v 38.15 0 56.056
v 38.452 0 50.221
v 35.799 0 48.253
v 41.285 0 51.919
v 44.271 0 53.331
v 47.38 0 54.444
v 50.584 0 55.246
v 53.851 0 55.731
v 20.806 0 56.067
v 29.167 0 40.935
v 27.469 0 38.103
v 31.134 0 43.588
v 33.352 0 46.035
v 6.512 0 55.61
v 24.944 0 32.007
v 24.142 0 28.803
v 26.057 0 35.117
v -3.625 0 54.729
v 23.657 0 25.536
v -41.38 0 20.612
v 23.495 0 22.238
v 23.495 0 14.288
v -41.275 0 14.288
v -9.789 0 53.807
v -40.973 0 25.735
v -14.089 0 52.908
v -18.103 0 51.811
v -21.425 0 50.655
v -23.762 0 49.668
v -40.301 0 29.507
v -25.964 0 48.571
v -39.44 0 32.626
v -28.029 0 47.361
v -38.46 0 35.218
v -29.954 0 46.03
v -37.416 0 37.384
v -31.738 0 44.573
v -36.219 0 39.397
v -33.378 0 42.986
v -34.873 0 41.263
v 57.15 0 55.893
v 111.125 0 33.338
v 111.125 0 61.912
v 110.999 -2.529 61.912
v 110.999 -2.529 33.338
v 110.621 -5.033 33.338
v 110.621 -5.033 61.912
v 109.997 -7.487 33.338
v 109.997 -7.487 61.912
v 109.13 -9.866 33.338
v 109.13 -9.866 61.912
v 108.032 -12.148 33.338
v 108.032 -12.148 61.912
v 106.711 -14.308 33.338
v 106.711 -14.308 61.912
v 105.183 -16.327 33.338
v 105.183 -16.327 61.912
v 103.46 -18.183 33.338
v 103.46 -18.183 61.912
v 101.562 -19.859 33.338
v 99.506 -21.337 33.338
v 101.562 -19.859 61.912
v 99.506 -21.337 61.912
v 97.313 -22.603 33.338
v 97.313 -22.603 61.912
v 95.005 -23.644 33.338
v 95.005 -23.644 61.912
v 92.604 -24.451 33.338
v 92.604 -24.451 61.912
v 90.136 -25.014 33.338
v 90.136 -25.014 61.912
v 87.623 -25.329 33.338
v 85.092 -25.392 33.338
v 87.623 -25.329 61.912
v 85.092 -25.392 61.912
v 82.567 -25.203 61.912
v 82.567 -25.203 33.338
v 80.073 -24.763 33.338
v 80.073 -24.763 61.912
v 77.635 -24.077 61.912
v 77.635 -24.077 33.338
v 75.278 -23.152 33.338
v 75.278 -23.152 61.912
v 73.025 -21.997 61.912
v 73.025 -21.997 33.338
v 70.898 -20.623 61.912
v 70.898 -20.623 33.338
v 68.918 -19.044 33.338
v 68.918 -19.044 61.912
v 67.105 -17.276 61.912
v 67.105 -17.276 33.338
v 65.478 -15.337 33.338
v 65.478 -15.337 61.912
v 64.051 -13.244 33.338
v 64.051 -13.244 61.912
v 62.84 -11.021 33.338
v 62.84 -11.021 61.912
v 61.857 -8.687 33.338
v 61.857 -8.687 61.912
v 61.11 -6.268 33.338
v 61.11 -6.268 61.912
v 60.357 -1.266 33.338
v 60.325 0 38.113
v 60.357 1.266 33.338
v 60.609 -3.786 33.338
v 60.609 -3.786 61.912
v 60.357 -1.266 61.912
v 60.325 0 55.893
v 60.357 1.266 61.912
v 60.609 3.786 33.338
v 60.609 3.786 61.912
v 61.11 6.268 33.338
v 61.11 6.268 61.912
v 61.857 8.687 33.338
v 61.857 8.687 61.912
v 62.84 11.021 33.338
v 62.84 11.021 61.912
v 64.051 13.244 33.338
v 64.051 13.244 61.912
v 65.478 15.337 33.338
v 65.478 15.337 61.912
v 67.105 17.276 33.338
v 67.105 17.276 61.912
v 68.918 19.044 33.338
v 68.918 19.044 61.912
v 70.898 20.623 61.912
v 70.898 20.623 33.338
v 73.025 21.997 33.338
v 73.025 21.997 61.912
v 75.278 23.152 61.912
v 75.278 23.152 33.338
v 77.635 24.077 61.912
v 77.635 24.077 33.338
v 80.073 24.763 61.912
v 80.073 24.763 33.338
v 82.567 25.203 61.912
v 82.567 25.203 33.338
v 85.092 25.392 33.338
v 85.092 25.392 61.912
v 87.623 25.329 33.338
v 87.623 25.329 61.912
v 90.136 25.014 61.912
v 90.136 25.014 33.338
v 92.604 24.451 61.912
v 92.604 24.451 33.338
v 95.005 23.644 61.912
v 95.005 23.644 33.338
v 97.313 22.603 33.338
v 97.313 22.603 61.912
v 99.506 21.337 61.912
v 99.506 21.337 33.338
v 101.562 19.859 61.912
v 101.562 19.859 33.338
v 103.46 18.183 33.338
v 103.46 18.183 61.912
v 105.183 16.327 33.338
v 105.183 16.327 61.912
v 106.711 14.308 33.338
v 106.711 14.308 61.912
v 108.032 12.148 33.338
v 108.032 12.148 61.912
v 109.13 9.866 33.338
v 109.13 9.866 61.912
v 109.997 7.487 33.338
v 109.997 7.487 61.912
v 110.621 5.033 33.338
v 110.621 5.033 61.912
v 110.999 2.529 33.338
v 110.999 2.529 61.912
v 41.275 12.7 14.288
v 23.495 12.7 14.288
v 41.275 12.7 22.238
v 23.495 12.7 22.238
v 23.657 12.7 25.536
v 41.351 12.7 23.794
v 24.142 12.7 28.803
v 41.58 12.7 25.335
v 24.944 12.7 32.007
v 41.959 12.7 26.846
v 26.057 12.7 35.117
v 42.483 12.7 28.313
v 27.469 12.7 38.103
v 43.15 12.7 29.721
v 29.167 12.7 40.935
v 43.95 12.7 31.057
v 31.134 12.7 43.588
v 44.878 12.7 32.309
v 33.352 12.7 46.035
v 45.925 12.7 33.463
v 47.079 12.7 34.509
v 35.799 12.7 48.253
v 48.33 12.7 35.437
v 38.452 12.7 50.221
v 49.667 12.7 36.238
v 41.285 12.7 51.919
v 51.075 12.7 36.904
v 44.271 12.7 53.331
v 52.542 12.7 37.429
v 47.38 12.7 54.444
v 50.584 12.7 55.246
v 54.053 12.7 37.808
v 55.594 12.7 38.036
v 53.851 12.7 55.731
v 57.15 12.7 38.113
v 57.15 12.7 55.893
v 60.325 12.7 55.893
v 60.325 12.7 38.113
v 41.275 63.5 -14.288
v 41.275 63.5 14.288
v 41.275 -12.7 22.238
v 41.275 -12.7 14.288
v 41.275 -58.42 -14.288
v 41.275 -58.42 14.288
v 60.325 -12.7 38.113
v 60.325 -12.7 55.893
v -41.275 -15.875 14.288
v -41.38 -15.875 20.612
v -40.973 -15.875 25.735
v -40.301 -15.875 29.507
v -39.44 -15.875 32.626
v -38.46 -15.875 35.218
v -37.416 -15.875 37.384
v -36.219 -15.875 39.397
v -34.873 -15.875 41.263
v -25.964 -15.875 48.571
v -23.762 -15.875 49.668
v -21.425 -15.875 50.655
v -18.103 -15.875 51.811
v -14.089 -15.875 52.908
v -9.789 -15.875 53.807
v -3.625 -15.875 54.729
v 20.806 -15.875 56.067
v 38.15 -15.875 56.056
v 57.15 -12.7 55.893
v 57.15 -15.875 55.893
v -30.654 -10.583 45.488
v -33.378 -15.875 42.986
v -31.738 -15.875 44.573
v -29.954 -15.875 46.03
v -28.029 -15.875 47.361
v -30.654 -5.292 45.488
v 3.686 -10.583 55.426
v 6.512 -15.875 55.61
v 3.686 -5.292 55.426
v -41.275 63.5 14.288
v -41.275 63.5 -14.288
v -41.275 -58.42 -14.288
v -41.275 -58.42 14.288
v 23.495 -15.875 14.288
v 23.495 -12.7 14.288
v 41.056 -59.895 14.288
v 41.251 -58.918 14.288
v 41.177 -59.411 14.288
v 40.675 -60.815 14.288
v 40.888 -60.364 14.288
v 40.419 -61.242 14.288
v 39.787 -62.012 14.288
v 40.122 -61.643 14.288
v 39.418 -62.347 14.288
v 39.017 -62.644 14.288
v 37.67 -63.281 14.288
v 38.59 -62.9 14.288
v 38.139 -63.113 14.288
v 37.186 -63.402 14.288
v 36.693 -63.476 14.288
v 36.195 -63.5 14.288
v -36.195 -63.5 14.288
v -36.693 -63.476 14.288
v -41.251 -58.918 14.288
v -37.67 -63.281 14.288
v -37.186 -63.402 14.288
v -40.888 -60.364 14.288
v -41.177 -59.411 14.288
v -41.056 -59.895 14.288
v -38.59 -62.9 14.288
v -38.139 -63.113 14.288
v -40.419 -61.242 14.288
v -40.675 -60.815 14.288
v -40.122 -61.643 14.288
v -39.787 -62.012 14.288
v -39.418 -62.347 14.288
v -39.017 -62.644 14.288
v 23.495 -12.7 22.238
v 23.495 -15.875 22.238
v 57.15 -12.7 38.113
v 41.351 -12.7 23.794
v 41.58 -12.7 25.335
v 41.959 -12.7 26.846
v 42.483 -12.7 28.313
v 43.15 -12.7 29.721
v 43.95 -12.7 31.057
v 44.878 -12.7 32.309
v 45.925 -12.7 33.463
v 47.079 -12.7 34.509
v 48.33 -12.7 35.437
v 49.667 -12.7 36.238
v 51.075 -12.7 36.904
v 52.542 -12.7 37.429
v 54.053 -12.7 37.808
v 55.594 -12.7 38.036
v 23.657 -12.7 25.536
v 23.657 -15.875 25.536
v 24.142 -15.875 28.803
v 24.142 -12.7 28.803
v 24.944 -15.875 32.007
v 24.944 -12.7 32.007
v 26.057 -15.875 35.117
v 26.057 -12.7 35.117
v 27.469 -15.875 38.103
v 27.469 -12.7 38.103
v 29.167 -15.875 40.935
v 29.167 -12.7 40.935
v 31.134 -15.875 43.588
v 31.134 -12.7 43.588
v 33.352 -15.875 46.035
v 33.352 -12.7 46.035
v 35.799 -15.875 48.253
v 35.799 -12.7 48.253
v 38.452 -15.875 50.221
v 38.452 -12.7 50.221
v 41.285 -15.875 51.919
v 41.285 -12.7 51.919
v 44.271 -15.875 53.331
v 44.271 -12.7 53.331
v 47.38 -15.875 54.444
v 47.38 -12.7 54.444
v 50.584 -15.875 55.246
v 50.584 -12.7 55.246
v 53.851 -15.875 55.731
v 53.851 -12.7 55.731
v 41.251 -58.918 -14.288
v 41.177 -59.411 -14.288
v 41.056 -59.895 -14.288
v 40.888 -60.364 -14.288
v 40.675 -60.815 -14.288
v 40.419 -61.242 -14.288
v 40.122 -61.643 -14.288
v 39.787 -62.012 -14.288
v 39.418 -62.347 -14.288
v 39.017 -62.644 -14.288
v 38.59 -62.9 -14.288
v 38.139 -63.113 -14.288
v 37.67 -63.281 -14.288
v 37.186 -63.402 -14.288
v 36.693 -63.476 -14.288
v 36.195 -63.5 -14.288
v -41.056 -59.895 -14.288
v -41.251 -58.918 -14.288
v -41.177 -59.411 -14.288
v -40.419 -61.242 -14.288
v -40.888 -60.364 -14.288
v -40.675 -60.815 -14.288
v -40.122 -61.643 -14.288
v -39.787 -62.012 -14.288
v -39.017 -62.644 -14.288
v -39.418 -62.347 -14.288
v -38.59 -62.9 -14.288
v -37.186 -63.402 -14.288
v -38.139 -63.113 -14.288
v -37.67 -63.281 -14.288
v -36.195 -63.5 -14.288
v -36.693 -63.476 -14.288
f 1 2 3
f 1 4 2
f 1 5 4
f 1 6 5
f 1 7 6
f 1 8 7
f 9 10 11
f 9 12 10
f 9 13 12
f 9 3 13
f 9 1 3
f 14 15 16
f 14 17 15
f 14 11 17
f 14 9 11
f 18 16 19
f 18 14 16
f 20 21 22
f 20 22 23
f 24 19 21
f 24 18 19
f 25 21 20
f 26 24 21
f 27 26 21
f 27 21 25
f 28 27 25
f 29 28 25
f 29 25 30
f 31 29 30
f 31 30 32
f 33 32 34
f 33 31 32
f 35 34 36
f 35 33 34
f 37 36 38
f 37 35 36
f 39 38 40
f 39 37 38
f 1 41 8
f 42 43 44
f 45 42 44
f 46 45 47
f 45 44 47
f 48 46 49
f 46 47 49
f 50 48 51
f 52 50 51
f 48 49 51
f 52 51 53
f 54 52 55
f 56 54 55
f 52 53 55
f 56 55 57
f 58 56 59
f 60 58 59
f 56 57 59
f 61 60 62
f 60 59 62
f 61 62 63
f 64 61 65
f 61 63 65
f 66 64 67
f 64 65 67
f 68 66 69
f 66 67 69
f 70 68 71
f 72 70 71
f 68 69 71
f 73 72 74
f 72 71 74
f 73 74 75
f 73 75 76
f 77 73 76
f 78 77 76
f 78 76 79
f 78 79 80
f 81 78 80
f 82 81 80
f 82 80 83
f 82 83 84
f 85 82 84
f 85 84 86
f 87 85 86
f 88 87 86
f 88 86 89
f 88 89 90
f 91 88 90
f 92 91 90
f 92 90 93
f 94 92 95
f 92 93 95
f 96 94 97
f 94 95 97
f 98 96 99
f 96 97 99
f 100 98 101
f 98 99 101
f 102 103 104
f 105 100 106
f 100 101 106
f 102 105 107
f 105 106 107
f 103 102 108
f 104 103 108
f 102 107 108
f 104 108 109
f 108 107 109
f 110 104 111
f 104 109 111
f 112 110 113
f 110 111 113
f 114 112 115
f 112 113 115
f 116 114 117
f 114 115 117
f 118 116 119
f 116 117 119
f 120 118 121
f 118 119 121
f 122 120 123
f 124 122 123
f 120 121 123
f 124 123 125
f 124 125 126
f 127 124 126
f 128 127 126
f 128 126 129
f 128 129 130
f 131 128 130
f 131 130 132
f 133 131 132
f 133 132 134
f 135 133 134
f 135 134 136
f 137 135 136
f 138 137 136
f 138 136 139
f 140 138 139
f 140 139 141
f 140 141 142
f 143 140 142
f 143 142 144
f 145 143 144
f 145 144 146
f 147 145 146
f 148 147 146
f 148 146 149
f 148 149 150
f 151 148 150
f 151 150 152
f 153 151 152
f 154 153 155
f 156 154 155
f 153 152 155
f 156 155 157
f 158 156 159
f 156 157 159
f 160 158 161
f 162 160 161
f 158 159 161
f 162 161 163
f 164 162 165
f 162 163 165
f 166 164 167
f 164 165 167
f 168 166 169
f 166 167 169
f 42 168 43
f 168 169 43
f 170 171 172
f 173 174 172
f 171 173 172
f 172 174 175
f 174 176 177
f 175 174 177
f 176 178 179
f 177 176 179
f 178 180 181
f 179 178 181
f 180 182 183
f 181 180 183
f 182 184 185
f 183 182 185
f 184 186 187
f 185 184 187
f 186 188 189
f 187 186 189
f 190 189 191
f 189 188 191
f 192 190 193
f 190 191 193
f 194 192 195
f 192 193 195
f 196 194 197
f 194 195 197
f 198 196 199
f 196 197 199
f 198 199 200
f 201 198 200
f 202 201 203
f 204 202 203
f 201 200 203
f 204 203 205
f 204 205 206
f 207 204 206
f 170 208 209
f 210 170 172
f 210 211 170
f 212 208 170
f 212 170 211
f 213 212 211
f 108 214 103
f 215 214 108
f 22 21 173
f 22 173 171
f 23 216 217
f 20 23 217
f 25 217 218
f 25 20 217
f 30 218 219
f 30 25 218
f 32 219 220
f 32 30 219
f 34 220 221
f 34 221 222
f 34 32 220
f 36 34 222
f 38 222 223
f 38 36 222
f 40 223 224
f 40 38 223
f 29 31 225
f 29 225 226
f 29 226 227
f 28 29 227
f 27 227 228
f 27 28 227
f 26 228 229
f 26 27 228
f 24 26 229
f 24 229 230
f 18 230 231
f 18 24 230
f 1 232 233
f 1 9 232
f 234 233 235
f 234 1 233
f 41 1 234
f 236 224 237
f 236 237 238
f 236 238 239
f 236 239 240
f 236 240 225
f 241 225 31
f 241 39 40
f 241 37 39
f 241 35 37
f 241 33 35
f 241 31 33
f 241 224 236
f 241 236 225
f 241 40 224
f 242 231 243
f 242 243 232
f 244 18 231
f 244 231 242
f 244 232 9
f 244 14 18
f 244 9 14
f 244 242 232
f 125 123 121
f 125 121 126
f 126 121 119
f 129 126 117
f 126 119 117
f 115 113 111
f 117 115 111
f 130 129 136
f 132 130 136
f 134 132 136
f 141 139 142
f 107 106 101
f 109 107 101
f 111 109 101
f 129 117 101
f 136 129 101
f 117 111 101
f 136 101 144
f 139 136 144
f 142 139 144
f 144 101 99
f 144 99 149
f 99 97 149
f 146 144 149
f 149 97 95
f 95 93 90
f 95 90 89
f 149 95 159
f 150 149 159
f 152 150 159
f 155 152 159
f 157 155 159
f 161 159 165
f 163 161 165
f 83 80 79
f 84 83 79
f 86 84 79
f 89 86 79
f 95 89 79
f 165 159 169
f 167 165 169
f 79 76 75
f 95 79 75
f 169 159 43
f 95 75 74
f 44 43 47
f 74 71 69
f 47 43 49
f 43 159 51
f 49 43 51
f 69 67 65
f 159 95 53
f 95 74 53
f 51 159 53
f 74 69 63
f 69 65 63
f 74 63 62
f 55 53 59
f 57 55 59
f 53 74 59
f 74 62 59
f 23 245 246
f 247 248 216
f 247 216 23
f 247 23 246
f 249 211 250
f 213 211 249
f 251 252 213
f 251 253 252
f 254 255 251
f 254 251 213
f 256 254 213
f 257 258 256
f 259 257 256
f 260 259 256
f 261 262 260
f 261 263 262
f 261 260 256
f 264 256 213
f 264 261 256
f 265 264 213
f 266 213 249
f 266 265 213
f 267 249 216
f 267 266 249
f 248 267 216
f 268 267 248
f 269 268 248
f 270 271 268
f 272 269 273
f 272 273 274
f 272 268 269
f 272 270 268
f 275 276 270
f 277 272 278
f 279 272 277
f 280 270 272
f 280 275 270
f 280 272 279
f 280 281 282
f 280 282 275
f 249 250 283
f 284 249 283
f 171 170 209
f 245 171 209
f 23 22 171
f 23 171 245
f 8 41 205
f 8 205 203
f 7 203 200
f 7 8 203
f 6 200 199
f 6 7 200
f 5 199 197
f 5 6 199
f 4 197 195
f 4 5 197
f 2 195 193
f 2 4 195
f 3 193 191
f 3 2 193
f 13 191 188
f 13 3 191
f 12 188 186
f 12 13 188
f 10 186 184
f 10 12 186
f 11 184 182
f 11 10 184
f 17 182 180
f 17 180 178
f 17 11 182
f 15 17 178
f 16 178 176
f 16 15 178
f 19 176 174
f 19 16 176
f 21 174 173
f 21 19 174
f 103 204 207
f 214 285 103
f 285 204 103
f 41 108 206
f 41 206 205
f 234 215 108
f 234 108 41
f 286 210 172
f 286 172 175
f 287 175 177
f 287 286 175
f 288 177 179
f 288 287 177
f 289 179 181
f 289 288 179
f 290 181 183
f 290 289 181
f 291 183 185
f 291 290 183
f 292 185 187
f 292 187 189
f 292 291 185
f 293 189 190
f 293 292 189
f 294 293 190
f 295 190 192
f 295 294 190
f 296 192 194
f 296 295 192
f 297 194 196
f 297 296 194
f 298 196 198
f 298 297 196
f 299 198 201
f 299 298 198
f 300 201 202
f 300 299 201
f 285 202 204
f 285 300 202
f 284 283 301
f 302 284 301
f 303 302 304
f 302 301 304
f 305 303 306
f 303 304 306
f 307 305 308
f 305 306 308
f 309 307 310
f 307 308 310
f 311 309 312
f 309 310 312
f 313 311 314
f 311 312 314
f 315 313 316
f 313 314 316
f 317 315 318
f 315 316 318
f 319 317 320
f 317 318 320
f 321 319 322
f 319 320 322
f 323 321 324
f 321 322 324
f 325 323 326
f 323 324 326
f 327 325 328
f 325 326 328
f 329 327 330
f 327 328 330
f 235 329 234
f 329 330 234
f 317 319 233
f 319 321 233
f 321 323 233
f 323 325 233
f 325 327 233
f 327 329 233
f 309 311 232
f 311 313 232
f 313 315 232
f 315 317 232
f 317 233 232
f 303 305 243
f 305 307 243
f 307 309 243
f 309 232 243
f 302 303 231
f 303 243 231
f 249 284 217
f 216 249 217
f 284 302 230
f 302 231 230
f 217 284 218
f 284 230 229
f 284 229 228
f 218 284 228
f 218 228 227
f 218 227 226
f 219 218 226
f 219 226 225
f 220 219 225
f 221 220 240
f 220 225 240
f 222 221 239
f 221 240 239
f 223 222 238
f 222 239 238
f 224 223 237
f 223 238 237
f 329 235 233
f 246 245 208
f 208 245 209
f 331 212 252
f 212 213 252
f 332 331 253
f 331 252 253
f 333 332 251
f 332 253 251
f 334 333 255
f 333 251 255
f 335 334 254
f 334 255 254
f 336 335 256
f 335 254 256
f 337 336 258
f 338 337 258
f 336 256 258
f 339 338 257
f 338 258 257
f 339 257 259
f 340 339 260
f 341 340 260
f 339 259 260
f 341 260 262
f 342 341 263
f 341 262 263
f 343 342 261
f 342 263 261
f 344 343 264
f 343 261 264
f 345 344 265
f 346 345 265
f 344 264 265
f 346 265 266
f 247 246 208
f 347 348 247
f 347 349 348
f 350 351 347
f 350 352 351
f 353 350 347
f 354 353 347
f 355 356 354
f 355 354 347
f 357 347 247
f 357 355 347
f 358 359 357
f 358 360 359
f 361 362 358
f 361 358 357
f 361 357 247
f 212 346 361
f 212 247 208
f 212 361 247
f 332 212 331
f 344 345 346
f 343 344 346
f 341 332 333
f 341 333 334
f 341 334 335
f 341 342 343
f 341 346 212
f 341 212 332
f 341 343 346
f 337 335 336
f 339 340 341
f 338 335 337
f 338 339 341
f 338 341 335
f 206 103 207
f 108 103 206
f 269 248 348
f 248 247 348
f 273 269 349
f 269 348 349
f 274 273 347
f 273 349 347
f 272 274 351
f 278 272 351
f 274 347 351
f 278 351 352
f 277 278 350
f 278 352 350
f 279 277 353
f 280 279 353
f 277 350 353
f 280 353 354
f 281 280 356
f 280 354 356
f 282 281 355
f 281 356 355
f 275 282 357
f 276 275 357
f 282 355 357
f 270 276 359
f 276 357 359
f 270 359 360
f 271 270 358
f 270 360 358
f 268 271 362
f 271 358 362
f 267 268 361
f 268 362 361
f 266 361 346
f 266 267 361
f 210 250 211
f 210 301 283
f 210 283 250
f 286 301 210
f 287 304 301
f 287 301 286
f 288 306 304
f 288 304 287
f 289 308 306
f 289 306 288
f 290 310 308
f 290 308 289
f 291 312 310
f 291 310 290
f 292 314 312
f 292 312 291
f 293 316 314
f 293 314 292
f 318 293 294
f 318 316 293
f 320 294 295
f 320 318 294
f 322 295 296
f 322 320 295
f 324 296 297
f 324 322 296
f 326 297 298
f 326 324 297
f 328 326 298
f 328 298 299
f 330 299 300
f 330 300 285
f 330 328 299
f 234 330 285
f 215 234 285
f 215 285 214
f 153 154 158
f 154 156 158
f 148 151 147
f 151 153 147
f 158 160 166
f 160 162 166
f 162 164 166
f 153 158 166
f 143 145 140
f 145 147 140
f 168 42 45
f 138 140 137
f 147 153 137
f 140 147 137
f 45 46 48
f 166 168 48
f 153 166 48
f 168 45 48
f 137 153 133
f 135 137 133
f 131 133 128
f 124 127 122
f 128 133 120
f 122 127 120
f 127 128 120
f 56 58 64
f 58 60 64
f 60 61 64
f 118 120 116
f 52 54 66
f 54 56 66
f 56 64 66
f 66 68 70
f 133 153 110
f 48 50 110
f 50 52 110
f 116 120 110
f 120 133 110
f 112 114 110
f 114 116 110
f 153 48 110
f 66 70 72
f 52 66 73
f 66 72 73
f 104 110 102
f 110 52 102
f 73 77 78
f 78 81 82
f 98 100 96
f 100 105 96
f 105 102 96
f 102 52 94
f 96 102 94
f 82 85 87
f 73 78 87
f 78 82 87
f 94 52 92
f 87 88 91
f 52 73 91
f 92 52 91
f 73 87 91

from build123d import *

# Parameters (mm, degrees)
F1_DEPTH = 63.5
F2_DEPTH = 12.7
F3_DEPTH = 15.875
F5_R     = 5.08


with BuildPart() as f1:
    # F0 (on Front) → F1 (new body, symmetric)
    with BuildSketch(Plane.XZ):
        Polygon((-41.275, -14.2875), (41.275, -14.2875), (41.275, 14.2875), (23.495, 14.2875), (-41.275, 14.2875), align=None)
    extrude(amount=F1_DEPTH, both=True)

    # F0 (on Front) → F2 (join, symmetric)
    with BuildSketch(Plane.XZ):
        with BuildLine():
            Line((23.495, 14.2875), (41.275, 14.2875))
            Line((41.275, 14.2875), (41.275, 22.2377))
            ThreePointArc((41.275, 22.2377), (45.92468, 33.46302), (57.15, 38.1127))
            Line((57.15, 38.1127), (60.325, 38.1127))
            Line((60.325, 38.1127), (60.325, 55.8927))
            Line((60.325, 55.8927), (57.15, 55.8927))
            ThreePointArc((57.15, 55.8927), (33.352321, 46.035379), (23.495, 22.2377))
            Line((23.495, 22.2377), (23.495, 14.2875))
        make_face()
    extrude(amount=F2_DEPTH, both=True)

    # F0 (on Front) → F3 (join)
    with BuildSketch(Plane.XZ):
        with BuildLine():
            add(Edge.make_bspline(
                [(-41.275, 14.2875), (-44.044573, 60.048796), (-4.34476, 56.230828), (57.15, 55.8927)],
                knots=[0, 0, 0, 0, 106.857257, 106.857257, 106.857257, 106.857257], degree=3))
            Line((-41.275, 14.2875), (23.495, 14.2875))
            Line((23.495, 14.2875), (23.495, 22.2377))
            ThreePointArc((23.495, 22.2377), (33.352321, 46.035379), (57.15, 55.8927))
        make_face()
    extrude(amount=F3_DEPTH)

    # F0 (on Front) → F4 (revolve)
    with BuildSketch(Plane.XZ):
        Polygon((85.725, 61.9125), (85.725, 55.8927), (85.725, 38.1127), (85.725, 33.3375), (111.125, 33.3375), (111.125, 61.9125), align=None)
    revolve(axis=Axis((85.725, 0, 47.625), (0, 0, -1)))

    # F5
    f5_edges = [f1.edges().sort_by_distance(p)[0] for p in [
        (-41.275, -63.5, 0),
        (41.275, -63.5, 0),
    ]]
    fillet(f5_edges, radius=F5_R)


solid = f1.part
